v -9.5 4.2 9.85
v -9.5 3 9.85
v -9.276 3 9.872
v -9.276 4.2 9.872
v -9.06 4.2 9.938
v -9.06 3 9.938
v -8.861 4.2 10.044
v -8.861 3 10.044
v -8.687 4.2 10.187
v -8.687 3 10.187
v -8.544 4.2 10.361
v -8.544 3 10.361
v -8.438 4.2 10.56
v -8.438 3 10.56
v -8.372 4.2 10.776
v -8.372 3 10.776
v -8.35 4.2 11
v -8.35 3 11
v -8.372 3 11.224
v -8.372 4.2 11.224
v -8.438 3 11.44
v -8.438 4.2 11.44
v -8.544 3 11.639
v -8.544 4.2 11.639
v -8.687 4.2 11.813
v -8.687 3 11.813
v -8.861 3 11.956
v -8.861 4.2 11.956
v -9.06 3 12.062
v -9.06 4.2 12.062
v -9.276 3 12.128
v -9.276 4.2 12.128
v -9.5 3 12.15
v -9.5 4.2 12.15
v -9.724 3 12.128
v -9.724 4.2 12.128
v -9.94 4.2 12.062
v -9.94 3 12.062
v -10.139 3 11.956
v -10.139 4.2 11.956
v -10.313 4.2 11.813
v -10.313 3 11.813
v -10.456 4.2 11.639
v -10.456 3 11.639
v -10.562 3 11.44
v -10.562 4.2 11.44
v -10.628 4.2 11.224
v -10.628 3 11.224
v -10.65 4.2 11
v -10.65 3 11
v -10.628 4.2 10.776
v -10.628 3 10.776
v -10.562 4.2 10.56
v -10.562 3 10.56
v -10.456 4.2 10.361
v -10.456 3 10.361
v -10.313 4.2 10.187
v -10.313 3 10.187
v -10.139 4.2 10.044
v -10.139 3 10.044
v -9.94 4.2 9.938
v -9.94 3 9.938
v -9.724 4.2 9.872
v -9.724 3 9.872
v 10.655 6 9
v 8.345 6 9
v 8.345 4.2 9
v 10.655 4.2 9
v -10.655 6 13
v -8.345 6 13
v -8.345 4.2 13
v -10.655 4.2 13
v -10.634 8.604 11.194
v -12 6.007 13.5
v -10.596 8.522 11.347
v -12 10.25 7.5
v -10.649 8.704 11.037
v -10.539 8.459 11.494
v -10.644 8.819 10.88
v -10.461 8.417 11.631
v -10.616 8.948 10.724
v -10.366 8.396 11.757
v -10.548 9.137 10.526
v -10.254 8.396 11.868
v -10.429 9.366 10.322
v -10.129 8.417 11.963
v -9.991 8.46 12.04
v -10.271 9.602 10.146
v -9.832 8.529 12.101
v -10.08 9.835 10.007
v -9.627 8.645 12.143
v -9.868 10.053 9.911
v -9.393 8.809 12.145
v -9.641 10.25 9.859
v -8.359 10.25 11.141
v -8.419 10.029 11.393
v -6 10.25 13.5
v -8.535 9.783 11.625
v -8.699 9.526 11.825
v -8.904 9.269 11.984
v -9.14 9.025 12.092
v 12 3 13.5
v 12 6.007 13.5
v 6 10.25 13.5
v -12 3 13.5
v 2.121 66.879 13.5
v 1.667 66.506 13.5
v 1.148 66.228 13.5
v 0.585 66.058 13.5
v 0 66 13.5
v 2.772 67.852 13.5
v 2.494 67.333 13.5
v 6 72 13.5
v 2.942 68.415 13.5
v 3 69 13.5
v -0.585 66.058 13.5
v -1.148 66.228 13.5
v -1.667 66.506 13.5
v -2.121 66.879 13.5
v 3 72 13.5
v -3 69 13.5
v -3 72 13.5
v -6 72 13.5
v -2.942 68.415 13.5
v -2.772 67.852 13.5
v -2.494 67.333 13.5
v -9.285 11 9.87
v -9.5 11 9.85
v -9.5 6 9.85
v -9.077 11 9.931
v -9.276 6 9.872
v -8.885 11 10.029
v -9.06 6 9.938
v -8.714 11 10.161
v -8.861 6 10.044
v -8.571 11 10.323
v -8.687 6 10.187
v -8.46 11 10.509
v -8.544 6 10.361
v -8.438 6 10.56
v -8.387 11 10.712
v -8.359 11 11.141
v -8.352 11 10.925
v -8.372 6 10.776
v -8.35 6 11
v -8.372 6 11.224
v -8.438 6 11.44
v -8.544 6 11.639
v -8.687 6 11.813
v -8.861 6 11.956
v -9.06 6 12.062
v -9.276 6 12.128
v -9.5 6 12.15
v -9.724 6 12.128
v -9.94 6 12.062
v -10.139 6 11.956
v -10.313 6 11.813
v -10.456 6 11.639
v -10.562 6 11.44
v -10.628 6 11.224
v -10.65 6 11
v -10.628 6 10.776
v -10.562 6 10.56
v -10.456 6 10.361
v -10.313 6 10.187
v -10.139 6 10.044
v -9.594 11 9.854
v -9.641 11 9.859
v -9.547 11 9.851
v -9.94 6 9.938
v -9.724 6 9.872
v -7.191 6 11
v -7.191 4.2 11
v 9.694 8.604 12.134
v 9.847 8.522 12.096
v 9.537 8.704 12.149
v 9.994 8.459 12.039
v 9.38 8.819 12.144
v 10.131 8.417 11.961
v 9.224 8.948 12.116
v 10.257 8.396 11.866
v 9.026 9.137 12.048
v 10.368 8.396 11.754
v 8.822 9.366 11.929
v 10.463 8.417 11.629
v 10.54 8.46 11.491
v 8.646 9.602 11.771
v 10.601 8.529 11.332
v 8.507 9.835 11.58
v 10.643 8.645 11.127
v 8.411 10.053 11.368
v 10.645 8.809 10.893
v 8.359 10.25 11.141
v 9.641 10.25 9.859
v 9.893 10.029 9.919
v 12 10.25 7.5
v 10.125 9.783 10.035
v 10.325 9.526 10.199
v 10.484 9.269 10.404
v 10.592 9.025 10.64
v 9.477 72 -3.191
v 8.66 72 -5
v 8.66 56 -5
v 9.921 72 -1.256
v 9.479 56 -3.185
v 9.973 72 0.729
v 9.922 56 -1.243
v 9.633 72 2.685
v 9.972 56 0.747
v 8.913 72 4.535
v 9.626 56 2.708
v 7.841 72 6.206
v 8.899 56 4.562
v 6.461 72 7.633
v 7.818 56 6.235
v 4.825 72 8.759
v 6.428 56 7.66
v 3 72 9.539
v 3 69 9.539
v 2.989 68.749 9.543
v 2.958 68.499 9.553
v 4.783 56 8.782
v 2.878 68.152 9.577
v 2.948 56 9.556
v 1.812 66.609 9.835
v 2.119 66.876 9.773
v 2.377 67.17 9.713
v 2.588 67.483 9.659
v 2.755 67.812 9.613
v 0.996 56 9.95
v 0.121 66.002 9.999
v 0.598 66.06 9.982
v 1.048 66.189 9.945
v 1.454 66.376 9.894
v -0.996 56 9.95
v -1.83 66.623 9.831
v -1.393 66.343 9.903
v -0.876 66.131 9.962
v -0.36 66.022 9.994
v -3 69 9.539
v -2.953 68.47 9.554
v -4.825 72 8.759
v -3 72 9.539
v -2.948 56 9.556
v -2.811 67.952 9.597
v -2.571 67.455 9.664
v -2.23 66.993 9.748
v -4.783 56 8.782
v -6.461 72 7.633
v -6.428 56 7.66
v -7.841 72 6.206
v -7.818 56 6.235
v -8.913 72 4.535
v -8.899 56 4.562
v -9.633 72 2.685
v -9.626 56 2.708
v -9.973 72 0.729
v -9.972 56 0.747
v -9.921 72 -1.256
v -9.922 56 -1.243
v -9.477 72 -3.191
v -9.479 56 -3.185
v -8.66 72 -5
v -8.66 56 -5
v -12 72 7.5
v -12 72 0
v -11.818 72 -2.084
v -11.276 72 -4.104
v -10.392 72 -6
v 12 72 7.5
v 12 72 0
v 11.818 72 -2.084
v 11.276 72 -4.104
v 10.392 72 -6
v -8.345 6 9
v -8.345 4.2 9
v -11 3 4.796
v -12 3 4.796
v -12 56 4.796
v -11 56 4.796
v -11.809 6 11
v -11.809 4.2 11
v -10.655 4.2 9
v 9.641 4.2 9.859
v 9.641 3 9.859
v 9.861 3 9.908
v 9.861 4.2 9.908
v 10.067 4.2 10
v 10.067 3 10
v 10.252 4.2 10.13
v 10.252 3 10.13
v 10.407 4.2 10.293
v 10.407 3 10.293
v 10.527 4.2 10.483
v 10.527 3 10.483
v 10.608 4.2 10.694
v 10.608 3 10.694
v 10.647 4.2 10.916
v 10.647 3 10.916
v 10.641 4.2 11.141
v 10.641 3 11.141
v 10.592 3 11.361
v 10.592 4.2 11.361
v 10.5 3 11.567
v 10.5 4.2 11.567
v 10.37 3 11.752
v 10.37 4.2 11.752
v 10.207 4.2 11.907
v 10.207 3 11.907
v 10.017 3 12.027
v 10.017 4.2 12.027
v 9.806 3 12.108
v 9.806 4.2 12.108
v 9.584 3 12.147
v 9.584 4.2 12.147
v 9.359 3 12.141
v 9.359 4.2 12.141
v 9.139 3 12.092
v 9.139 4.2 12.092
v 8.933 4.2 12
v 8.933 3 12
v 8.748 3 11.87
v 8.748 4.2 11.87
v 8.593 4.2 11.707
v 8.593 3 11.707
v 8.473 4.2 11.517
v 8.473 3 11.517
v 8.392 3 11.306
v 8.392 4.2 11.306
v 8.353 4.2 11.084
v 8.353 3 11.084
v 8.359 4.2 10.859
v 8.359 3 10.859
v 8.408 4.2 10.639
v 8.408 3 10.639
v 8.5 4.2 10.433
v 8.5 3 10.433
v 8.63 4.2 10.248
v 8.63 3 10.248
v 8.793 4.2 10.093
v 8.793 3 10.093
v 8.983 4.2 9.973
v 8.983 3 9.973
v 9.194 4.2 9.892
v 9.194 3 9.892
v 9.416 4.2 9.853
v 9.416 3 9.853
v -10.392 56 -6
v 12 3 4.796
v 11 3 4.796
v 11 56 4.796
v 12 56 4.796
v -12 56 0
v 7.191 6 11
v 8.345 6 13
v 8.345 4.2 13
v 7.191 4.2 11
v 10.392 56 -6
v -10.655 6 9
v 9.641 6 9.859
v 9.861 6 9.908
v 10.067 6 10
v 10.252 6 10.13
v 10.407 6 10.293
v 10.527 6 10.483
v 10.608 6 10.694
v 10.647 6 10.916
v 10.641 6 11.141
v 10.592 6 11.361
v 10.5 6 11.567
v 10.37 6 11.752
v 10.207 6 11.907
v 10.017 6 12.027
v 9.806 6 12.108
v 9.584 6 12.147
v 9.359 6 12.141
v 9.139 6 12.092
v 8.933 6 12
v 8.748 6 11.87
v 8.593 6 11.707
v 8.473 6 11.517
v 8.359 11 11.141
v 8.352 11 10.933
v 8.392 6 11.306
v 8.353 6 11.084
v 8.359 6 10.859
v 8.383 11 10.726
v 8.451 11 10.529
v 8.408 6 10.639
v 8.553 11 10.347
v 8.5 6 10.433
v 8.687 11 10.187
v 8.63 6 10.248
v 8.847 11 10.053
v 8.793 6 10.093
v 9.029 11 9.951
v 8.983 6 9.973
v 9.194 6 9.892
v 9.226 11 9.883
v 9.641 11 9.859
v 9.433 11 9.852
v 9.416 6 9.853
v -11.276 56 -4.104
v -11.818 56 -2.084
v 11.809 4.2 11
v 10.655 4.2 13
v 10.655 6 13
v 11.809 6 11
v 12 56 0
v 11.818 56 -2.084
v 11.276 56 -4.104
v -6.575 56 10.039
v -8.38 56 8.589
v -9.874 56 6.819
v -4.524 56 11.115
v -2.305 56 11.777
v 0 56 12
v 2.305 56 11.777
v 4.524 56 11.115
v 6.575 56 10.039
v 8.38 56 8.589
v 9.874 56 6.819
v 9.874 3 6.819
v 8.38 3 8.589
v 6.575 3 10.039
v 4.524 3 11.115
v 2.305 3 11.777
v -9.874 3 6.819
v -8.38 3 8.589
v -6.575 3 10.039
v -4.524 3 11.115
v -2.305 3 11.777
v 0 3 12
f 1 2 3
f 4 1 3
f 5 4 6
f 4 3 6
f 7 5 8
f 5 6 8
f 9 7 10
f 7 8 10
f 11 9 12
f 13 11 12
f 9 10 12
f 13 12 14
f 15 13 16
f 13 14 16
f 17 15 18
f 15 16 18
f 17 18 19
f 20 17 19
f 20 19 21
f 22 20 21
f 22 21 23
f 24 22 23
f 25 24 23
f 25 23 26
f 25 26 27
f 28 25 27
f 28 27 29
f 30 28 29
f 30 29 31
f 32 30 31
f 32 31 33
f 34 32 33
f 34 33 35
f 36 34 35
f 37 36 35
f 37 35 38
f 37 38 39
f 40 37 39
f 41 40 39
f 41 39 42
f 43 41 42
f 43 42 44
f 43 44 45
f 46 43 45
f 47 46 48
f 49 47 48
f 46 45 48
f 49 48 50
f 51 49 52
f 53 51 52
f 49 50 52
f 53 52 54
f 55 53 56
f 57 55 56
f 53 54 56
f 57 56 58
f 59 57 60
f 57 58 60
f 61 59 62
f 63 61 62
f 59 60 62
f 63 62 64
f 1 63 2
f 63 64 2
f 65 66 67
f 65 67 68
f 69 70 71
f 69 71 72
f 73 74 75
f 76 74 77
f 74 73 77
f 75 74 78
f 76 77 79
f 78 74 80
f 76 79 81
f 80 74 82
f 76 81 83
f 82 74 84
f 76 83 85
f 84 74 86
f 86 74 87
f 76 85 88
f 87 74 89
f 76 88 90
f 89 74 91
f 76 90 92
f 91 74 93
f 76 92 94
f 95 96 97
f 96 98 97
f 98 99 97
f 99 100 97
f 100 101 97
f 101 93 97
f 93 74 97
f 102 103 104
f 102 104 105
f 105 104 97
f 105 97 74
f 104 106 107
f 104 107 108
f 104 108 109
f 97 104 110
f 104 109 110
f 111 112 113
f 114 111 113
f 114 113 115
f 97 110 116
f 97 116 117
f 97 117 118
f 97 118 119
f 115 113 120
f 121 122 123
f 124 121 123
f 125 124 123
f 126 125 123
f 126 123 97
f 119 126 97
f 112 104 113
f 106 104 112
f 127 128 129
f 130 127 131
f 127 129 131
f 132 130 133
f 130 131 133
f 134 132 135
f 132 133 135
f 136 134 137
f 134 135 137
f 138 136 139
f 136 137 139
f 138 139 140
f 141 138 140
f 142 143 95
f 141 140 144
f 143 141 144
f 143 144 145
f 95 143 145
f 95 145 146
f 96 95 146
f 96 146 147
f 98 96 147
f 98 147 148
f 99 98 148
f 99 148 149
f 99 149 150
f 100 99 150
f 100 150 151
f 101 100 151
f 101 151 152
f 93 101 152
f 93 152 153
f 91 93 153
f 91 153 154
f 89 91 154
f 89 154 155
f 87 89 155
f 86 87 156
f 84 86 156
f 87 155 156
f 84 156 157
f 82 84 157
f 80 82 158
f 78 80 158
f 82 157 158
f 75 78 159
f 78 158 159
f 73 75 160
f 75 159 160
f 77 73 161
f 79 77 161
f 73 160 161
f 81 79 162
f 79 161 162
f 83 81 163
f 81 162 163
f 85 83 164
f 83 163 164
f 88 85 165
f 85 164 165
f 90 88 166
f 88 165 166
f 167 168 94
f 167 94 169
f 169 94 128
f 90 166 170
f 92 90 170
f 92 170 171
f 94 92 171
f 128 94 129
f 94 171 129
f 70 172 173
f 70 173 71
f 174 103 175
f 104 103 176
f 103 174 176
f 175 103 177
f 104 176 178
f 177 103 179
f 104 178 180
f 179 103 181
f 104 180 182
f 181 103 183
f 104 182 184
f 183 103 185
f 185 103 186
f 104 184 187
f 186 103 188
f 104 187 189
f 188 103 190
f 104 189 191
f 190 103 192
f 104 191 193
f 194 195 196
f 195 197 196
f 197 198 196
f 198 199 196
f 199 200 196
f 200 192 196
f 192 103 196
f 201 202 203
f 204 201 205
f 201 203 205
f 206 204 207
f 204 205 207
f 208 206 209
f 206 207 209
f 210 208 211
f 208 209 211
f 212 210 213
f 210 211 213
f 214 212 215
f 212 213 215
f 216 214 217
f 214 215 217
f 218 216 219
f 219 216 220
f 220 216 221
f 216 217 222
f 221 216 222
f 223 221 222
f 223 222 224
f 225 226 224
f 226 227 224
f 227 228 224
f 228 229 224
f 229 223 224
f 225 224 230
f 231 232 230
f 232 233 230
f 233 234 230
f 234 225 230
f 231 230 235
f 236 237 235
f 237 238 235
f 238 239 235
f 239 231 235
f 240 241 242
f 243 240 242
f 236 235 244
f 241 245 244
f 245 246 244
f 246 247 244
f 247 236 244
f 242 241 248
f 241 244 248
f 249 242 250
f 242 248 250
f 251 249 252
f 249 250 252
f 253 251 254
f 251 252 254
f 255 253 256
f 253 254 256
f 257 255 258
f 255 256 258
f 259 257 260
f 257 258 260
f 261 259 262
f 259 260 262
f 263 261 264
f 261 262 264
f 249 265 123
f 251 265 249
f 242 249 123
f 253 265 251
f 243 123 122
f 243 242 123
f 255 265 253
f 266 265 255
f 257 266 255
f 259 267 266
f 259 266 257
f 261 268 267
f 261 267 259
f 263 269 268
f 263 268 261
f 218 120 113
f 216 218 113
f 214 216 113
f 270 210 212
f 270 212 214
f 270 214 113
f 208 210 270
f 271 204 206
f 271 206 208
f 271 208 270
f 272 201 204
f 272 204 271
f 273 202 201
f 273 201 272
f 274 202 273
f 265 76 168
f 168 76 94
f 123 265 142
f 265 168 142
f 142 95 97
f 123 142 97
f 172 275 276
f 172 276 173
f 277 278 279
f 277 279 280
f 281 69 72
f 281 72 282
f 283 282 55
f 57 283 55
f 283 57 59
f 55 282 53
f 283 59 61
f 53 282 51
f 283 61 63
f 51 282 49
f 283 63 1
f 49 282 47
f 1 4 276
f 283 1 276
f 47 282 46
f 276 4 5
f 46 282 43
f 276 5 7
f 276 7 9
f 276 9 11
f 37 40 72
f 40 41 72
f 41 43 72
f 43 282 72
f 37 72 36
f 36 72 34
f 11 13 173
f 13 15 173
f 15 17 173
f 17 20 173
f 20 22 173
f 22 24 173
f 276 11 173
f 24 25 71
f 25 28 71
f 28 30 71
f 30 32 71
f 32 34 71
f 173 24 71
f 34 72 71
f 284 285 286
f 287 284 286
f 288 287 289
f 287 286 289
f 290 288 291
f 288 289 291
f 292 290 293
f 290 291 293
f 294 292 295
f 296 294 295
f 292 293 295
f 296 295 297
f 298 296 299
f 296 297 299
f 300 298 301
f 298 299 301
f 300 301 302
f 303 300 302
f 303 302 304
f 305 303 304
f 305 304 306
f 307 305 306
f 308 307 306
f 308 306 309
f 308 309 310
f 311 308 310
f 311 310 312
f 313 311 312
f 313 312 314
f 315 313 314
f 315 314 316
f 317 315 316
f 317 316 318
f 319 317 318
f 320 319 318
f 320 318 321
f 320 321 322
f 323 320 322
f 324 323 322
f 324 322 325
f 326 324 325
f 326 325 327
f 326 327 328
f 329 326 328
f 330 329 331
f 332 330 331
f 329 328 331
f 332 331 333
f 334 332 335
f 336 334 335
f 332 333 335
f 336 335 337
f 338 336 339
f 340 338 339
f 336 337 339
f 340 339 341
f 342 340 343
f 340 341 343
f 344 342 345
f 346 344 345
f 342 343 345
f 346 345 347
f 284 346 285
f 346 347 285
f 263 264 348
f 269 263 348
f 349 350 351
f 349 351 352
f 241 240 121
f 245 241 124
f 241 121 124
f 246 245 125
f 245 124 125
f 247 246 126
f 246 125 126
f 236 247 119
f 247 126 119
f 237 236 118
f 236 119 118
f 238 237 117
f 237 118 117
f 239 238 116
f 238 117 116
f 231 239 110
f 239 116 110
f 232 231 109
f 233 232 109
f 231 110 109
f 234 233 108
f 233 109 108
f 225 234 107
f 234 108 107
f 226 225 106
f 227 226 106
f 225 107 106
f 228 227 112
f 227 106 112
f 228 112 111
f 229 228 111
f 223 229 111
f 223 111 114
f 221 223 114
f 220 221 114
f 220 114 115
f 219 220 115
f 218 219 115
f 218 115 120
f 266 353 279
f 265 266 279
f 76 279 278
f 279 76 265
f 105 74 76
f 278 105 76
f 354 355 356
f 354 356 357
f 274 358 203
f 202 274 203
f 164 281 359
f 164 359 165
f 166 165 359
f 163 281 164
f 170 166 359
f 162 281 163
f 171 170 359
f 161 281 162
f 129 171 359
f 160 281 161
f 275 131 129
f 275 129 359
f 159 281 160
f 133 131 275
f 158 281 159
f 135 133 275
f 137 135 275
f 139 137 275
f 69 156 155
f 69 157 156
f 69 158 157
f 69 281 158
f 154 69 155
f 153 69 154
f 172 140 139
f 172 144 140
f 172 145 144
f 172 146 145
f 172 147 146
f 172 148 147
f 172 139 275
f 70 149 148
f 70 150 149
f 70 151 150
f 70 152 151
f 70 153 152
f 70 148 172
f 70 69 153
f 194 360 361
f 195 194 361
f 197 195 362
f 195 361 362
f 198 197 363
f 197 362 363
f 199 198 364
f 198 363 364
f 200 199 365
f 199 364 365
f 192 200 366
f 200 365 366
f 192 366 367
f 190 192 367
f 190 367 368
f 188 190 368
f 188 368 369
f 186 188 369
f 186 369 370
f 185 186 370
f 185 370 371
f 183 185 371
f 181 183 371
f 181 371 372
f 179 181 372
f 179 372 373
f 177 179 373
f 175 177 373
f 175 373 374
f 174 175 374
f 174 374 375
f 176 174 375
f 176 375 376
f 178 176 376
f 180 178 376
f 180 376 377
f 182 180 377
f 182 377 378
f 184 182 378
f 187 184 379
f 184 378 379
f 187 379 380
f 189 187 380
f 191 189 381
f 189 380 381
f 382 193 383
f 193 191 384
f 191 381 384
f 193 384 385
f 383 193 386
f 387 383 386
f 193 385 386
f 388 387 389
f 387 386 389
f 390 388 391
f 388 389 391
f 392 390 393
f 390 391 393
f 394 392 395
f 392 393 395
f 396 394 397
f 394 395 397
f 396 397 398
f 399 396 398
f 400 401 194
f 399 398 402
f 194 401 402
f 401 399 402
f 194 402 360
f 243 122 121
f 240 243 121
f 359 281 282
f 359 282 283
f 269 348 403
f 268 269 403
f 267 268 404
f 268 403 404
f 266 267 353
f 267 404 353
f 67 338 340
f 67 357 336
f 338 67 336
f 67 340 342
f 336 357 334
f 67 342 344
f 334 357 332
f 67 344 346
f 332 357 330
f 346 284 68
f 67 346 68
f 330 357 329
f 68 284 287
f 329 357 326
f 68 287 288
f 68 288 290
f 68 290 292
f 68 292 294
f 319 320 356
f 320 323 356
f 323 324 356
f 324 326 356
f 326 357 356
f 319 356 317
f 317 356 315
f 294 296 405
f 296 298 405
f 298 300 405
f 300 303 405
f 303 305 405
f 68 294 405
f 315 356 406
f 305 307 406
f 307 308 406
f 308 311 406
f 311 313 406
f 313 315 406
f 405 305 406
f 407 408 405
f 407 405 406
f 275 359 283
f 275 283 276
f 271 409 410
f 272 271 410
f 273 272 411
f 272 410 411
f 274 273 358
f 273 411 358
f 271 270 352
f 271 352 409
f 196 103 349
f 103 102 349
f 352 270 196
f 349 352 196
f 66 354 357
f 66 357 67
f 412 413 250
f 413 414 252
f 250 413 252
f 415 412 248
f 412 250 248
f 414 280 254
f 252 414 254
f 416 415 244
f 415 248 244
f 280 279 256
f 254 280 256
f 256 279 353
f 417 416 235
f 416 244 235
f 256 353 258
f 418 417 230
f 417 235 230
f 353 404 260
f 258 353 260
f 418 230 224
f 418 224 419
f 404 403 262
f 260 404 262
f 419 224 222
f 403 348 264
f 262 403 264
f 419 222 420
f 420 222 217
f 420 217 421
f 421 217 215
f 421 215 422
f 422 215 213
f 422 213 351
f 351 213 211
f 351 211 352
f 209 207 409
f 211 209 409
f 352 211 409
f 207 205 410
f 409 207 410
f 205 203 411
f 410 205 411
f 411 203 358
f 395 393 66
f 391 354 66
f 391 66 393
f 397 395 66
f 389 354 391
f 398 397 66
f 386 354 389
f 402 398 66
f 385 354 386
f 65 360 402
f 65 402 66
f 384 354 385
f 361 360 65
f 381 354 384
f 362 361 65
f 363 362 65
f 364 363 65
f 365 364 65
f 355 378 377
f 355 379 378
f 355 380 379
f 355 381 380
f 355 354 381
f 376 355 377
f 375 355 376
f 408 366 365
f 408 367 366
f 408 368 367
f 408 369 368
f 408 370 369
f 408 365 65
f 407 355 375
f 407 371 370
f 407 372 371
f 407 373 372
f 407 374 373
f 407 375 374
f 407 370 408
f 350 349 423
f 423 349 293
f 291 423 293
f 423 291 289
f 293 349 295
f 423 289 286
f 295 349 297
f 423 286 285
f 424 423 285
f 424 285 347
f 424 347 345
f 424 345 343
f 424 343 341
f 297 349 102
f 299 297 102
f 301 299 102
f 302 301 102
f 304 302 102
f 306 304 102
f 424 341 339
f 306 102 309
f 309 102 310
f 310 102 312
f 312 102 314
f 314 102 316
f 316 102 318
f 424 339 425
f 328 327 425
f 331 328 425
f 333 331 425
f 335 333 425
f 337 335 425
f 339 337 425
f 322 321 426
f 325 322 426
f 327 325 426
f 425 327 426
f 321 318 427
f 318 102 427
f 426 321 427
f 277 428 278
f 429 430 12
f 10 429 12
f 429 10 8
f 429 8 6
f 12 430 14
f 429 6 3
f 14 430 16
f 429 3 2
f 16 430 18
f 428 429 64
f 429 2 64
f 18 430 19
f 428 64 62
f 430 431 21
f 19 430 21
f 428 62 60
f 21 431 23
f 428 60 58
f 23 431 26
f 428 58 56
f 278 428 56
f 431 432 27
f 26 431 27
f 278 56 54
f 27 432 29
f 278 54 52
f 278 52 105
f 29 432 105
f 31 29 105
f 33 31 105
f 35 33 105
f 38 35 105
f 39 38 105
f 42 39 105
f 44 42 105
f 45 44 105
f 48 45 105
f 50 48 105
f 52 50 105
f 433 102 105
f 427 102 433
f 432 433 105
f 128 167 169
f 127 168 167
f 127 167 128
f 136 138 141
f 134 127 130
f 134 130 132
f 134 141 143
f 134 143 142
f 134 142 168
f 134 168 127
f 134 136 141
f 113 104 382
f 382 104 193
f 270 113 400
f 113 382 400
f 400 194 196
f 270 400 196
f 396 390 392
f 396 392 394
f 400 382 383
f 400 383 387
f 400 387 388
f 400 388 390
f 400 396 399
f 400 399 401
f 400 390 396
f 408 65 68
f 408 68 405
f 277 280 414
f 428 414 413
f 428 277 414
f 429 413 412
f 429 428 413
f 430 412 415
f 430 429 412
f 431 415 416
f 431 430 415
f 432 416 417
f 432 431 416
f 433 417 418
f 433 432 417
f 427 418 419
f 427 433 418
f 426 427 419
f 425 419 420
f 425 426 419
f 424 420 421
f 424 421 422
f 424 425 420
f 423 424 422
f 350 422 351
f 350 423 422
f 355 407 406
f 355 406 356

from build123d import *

# Parameters (mm, degrees)
BOSS_EXTRUDE1_DEPTH      = 56
BOSS_EXTRUDE2_DEPTH      = 16
BOSS_EXTRUDE3_DEPTH      = 3
BOSS_EXTRUDE3_DEPTH_BACK = 8
SKETCH4_W                = 24
SKETCH4_H                = 27
SKETCH5_W                = 28.405044576
SKETCH5_H                = 3.736732925
CUT_EXTRUDE2_DEPTH       = 78.826730626
CUT_EXTRUDE3_DEPTH       = 75.231058305
CUT_EXTRUDE5_DEPTH       = 3
CUT_EXTRUDE5_DEPTH_BACK  = 75.231058305
SKETCH8_W                = 24
SKETCH8_H                = 27
BOSS_EXTRUDE4_DEPTH      = 3
CHAMFER1_SIZE            = 4.25
SKETCH14_R               = 1.15
CUT_EXTRUDE8_DEPTH       = 8
CUT_EXTRUDE9_START       = -3
CUT_EXTRUDE9_DEPTH       = 1.8


with BuildPart() as part:
    # Sketch2 → Boss-Extrude1 (new body)
    with BuildSketch(Plane(origin=(0, 0, 0), x_dir=(1, 0, 0), z_dir=(0, 1, 0))):
        with BuildLine():
            Line((12, -13.5), (-12, -13.5))
            Line((-12, -13.5), (-12, -4.795831523))
            Line((-12, -4.795831523), (-11, -4.795831523))
            ThreePointArc((-11, -4.795831523), (0, -12), (11, -4.795831523))
            Line((11, -4.795831523), (12, -4.795831523))
            Line((12, -4.795831523), (12, -13.5))
        make_face()
    extrude(amount=BOSS_EXTRUDE1_DEPTH)

    # Sketch3 → Boss-Extrude2 (add)
    with BuildSketch(Plane(origin=(0, 56, 0), x_dir=(1, 0, 0), z_dir=(0, 1, 0))):
        with BuildLine():
            Line((-12, -13.5), (12, -13.5))
            Line((12, -13.5), (12, 0))
            ThreePointArc((12, 0), (11.591109915, 3.105828541), (10.392304845, 6))
            Line((10.392304845, 6), (8.660254038, 5))
            ThreePointArc((8.660254038, 5), (0, -10), (-8.660254038, 5))
            Line((-8.660254038, 5), (-10.392304845, 6))
            ThreePointArc((-10.392304845, 6), (-11.591109915, 3.105828541), (-12, 0))
            Line((-12, 0), (-12, -13.5))
        make_face()
    extrude(amount=BOSS_EXTRUDE2_DEPTH)

    # Sketch4 → Boss-Extrude3 (add, two sides: drawn at the far end of the back side and taken through both)
    with BuildSketch(Plane(origin=(0, 0, 0), x_dir=(1, 0, 0), z_dir=(0, 1, 0)).offset(-BOSS_EXTRUDE3_DEPTH_BACK)):
        Rectangle(SKETCH4_W, SKETCH4_H)
    extrude(amount=BOSS_EXTRUDE3_DEPTH + BOSS_EXTRUDE3_DEPTH_BACK)

    # Sketch5 → Cut-Revolve1 (revolve, cut)
    with BuildSketch(Plane(origin=(0, 0, 0), x_dir=(0, 0, -1), z_dir=(1, 0, 0))):
        with Locations((0.702522288, -8.868366462)):
            Rectangle(SKETCH5_W, SKETCH5_H)
    revolve(axis=Axis((0, 72, 13.5), (0, 0, -1)), mode=Mode.SUBTRACT)

    # Sketch6 → Cut-Extrude2 (cut, through all)
    with BuildSketch(Plane.XY.offset(13.5)):
        with BuildLine():
            Line((-3, 72), (-3, 69))
            ThreePointArc((-3, 69), (0, 66), (3, 69))
            Line((3, 69), (3, 72))
            Line((3, 72), (-3, 72))
        make_face()
    extrude(amount=-CUT_EXTRUDE2_DEPTH, mode=Mode.SUBTRACT)

    # Sketch7 → Cut-Extrude3 (cut, through all)
    with BuildSketch(Plane(origin=(0, 0, 0), x_dir=(1, 0, 0), z_dir=(0, 1, 0))):
        Polygon((6, -13.5), (12, -7.5), (12, -13.5), align=None)
        Polygon((-6, -13.5), (-12, -13.5), (-12, -7.5), align=None)
    extrude(amount=CUT_EXTRUDE3_DEPTH, mode=Mode.SUBTRACT)

    # Sketch8 → Cut-Extrude5 (cut, two sides: drawn at the far end of the back side and taken through both)
    with BuildSketch(Plane(origin=(0, 0, 0), x_dir=(1, 0, 0), z_dir=(0, 1, 0)).offset(-CUT_EXTRUDE5_DEPTH_BACK)):
        Rectangle(SKETCH8_W, SKETCH8_H)
    extrude(amount=CUT_EXTRUDE5_DEPTH + CUT_EXTRUDE5_DEPTH_BACK, mode=Mode.SUBTRACT)

    # Sketch13 → Boss-Extrude4 (add)
    with BuildSketch(Plane.XZ.offset(-3)):
        Polygon((-12, 7.5), (-12, 13.5), (-6, 13.5), align=None)
        Polygon((6, 13.5), (12, 13.5), (12, 7.5), align=None)
    extrude(amount=-BOSS_EXTRUDE4_DEPTH)

    # Chamfer1
    # the kernel refuses this chamfer: 4.25 mm, written as the material it adds along each edge
    with BuildSketch(Plane(origin=(1.728431539, 6, 21.228431539), x_dir=(-0.7068394360706696, -0.02749587661058644, 0.7068394360706773), z_dir=(-0.7071067811865515, 0, -0.7071067811865437))) as chamfer1_piece_1_section:
        Polygon((CHAMFER1_SIZE * 0.999621916911, CHAMFER1_SIZE * 0.0274958766106), (-CHAMFER1_SIZE * 0.0274958766106, CHAMFER1_SIZE * 0.999621916911), (0, 0), align=None)
    chamfer1_piece_1 = extrude(amount=30.344586772, mode=Mode.PRIVATE)
    chamfer1_piece_1 = split(chamfer1_piece_1, bisect_by=Plane(origin=(-12, 7.617398018, 11.205698206), z_dir=(1, 0, 0)), keep=Keep.TOP, mode=Mode.PRIVATE)
    chamfer1_piece_1 = split(chamfer1_piece_1, bisect_by=Plane(origin=(-9.705698206, 7.617398018, 13.5), z_dir=(0, 0, -1)), keep=Keep.TOP, mode=Mode.PRIVATE)
    add(chamfer1_piece_1)
    with BuildSketch(Plane(origin=(19.728431539, 6, -0.228431539), x_dir=(0.70683943607067, -0.02749587661058643, 0.706839436070677), z_dir=(-0.707106781186551, 0, 0.7071067811865441))) as chamfer1_piece_2_section:
        Polygon((CHAMFER1_SIZE * 0.999621916911, CHAMFER1_SIZE * 0.0274958766106), (-CHAMFER1_SIZE * 0.0274958766106, CHAMFER1_SIZE * 0.999621916911), (0, 0), align=None)
    chamfer1_piece_2 = extrude(amount=30.344586772, mode=Mode.PRIVATE)
    chamfer1_piece_2 = split(chamfer1_piece_2, bisect_by=Plane(origin=(12, 7.617398018, 11.205698206), z_dir=(-1, 0, 0)), keep=Keep.TOP, mode=Mode.PRIVATE)
    chamfer1_piece_2 = split(chamfer1_piece_2, bisect_by=Plane(origin=(9.705698206, 7.617398018, 13.5), z_dir=(0, 0, -1)), keep=Keep.TOP, mode=Mode.PRIVATE)
    add(chamfer1_piece_2)

    # Sketch14 → Cut-Extrude8 (cut)
    with BuildSketch(Plane.XZ.offset(-3)):
        with Locations(Location((-9.5, 11, 0), (0, 0, 270))):
            Circle(SKETCH14_R)
        with Locations(Location((9.5, 11, 0), (0, 0, 277.057128313))):
            Circle(SKETCH14_R)
    extrude(amount=-CUT_EXTRUDE8_DEPTH, mode=Mode.SUBTRACT)

    # Sketch15 → Cut-Extrude9 (cut)
    with BuildSketch(Plane.XZ.offset(-3).offset(CUT_EXTRUDE9_START)):
        Polygon((-7.190598923, 11), (-8.345299462, 13), (-10.654700538, 13), (-11.809401077, 11), (-10.654700538, 9), (-8.345299462, 9), align=None)
        Polygon((11.809401077, 11), (10.654700538, 13), (8.345299462, 13), (7.190598923, 11), (8.345299462, 9), (10.654700538, 9), align=None)
    extrude(amount=CUT_EXTRUDE9_DEPTH, mode=Mode.SUBTRACT)


solid = part.part
